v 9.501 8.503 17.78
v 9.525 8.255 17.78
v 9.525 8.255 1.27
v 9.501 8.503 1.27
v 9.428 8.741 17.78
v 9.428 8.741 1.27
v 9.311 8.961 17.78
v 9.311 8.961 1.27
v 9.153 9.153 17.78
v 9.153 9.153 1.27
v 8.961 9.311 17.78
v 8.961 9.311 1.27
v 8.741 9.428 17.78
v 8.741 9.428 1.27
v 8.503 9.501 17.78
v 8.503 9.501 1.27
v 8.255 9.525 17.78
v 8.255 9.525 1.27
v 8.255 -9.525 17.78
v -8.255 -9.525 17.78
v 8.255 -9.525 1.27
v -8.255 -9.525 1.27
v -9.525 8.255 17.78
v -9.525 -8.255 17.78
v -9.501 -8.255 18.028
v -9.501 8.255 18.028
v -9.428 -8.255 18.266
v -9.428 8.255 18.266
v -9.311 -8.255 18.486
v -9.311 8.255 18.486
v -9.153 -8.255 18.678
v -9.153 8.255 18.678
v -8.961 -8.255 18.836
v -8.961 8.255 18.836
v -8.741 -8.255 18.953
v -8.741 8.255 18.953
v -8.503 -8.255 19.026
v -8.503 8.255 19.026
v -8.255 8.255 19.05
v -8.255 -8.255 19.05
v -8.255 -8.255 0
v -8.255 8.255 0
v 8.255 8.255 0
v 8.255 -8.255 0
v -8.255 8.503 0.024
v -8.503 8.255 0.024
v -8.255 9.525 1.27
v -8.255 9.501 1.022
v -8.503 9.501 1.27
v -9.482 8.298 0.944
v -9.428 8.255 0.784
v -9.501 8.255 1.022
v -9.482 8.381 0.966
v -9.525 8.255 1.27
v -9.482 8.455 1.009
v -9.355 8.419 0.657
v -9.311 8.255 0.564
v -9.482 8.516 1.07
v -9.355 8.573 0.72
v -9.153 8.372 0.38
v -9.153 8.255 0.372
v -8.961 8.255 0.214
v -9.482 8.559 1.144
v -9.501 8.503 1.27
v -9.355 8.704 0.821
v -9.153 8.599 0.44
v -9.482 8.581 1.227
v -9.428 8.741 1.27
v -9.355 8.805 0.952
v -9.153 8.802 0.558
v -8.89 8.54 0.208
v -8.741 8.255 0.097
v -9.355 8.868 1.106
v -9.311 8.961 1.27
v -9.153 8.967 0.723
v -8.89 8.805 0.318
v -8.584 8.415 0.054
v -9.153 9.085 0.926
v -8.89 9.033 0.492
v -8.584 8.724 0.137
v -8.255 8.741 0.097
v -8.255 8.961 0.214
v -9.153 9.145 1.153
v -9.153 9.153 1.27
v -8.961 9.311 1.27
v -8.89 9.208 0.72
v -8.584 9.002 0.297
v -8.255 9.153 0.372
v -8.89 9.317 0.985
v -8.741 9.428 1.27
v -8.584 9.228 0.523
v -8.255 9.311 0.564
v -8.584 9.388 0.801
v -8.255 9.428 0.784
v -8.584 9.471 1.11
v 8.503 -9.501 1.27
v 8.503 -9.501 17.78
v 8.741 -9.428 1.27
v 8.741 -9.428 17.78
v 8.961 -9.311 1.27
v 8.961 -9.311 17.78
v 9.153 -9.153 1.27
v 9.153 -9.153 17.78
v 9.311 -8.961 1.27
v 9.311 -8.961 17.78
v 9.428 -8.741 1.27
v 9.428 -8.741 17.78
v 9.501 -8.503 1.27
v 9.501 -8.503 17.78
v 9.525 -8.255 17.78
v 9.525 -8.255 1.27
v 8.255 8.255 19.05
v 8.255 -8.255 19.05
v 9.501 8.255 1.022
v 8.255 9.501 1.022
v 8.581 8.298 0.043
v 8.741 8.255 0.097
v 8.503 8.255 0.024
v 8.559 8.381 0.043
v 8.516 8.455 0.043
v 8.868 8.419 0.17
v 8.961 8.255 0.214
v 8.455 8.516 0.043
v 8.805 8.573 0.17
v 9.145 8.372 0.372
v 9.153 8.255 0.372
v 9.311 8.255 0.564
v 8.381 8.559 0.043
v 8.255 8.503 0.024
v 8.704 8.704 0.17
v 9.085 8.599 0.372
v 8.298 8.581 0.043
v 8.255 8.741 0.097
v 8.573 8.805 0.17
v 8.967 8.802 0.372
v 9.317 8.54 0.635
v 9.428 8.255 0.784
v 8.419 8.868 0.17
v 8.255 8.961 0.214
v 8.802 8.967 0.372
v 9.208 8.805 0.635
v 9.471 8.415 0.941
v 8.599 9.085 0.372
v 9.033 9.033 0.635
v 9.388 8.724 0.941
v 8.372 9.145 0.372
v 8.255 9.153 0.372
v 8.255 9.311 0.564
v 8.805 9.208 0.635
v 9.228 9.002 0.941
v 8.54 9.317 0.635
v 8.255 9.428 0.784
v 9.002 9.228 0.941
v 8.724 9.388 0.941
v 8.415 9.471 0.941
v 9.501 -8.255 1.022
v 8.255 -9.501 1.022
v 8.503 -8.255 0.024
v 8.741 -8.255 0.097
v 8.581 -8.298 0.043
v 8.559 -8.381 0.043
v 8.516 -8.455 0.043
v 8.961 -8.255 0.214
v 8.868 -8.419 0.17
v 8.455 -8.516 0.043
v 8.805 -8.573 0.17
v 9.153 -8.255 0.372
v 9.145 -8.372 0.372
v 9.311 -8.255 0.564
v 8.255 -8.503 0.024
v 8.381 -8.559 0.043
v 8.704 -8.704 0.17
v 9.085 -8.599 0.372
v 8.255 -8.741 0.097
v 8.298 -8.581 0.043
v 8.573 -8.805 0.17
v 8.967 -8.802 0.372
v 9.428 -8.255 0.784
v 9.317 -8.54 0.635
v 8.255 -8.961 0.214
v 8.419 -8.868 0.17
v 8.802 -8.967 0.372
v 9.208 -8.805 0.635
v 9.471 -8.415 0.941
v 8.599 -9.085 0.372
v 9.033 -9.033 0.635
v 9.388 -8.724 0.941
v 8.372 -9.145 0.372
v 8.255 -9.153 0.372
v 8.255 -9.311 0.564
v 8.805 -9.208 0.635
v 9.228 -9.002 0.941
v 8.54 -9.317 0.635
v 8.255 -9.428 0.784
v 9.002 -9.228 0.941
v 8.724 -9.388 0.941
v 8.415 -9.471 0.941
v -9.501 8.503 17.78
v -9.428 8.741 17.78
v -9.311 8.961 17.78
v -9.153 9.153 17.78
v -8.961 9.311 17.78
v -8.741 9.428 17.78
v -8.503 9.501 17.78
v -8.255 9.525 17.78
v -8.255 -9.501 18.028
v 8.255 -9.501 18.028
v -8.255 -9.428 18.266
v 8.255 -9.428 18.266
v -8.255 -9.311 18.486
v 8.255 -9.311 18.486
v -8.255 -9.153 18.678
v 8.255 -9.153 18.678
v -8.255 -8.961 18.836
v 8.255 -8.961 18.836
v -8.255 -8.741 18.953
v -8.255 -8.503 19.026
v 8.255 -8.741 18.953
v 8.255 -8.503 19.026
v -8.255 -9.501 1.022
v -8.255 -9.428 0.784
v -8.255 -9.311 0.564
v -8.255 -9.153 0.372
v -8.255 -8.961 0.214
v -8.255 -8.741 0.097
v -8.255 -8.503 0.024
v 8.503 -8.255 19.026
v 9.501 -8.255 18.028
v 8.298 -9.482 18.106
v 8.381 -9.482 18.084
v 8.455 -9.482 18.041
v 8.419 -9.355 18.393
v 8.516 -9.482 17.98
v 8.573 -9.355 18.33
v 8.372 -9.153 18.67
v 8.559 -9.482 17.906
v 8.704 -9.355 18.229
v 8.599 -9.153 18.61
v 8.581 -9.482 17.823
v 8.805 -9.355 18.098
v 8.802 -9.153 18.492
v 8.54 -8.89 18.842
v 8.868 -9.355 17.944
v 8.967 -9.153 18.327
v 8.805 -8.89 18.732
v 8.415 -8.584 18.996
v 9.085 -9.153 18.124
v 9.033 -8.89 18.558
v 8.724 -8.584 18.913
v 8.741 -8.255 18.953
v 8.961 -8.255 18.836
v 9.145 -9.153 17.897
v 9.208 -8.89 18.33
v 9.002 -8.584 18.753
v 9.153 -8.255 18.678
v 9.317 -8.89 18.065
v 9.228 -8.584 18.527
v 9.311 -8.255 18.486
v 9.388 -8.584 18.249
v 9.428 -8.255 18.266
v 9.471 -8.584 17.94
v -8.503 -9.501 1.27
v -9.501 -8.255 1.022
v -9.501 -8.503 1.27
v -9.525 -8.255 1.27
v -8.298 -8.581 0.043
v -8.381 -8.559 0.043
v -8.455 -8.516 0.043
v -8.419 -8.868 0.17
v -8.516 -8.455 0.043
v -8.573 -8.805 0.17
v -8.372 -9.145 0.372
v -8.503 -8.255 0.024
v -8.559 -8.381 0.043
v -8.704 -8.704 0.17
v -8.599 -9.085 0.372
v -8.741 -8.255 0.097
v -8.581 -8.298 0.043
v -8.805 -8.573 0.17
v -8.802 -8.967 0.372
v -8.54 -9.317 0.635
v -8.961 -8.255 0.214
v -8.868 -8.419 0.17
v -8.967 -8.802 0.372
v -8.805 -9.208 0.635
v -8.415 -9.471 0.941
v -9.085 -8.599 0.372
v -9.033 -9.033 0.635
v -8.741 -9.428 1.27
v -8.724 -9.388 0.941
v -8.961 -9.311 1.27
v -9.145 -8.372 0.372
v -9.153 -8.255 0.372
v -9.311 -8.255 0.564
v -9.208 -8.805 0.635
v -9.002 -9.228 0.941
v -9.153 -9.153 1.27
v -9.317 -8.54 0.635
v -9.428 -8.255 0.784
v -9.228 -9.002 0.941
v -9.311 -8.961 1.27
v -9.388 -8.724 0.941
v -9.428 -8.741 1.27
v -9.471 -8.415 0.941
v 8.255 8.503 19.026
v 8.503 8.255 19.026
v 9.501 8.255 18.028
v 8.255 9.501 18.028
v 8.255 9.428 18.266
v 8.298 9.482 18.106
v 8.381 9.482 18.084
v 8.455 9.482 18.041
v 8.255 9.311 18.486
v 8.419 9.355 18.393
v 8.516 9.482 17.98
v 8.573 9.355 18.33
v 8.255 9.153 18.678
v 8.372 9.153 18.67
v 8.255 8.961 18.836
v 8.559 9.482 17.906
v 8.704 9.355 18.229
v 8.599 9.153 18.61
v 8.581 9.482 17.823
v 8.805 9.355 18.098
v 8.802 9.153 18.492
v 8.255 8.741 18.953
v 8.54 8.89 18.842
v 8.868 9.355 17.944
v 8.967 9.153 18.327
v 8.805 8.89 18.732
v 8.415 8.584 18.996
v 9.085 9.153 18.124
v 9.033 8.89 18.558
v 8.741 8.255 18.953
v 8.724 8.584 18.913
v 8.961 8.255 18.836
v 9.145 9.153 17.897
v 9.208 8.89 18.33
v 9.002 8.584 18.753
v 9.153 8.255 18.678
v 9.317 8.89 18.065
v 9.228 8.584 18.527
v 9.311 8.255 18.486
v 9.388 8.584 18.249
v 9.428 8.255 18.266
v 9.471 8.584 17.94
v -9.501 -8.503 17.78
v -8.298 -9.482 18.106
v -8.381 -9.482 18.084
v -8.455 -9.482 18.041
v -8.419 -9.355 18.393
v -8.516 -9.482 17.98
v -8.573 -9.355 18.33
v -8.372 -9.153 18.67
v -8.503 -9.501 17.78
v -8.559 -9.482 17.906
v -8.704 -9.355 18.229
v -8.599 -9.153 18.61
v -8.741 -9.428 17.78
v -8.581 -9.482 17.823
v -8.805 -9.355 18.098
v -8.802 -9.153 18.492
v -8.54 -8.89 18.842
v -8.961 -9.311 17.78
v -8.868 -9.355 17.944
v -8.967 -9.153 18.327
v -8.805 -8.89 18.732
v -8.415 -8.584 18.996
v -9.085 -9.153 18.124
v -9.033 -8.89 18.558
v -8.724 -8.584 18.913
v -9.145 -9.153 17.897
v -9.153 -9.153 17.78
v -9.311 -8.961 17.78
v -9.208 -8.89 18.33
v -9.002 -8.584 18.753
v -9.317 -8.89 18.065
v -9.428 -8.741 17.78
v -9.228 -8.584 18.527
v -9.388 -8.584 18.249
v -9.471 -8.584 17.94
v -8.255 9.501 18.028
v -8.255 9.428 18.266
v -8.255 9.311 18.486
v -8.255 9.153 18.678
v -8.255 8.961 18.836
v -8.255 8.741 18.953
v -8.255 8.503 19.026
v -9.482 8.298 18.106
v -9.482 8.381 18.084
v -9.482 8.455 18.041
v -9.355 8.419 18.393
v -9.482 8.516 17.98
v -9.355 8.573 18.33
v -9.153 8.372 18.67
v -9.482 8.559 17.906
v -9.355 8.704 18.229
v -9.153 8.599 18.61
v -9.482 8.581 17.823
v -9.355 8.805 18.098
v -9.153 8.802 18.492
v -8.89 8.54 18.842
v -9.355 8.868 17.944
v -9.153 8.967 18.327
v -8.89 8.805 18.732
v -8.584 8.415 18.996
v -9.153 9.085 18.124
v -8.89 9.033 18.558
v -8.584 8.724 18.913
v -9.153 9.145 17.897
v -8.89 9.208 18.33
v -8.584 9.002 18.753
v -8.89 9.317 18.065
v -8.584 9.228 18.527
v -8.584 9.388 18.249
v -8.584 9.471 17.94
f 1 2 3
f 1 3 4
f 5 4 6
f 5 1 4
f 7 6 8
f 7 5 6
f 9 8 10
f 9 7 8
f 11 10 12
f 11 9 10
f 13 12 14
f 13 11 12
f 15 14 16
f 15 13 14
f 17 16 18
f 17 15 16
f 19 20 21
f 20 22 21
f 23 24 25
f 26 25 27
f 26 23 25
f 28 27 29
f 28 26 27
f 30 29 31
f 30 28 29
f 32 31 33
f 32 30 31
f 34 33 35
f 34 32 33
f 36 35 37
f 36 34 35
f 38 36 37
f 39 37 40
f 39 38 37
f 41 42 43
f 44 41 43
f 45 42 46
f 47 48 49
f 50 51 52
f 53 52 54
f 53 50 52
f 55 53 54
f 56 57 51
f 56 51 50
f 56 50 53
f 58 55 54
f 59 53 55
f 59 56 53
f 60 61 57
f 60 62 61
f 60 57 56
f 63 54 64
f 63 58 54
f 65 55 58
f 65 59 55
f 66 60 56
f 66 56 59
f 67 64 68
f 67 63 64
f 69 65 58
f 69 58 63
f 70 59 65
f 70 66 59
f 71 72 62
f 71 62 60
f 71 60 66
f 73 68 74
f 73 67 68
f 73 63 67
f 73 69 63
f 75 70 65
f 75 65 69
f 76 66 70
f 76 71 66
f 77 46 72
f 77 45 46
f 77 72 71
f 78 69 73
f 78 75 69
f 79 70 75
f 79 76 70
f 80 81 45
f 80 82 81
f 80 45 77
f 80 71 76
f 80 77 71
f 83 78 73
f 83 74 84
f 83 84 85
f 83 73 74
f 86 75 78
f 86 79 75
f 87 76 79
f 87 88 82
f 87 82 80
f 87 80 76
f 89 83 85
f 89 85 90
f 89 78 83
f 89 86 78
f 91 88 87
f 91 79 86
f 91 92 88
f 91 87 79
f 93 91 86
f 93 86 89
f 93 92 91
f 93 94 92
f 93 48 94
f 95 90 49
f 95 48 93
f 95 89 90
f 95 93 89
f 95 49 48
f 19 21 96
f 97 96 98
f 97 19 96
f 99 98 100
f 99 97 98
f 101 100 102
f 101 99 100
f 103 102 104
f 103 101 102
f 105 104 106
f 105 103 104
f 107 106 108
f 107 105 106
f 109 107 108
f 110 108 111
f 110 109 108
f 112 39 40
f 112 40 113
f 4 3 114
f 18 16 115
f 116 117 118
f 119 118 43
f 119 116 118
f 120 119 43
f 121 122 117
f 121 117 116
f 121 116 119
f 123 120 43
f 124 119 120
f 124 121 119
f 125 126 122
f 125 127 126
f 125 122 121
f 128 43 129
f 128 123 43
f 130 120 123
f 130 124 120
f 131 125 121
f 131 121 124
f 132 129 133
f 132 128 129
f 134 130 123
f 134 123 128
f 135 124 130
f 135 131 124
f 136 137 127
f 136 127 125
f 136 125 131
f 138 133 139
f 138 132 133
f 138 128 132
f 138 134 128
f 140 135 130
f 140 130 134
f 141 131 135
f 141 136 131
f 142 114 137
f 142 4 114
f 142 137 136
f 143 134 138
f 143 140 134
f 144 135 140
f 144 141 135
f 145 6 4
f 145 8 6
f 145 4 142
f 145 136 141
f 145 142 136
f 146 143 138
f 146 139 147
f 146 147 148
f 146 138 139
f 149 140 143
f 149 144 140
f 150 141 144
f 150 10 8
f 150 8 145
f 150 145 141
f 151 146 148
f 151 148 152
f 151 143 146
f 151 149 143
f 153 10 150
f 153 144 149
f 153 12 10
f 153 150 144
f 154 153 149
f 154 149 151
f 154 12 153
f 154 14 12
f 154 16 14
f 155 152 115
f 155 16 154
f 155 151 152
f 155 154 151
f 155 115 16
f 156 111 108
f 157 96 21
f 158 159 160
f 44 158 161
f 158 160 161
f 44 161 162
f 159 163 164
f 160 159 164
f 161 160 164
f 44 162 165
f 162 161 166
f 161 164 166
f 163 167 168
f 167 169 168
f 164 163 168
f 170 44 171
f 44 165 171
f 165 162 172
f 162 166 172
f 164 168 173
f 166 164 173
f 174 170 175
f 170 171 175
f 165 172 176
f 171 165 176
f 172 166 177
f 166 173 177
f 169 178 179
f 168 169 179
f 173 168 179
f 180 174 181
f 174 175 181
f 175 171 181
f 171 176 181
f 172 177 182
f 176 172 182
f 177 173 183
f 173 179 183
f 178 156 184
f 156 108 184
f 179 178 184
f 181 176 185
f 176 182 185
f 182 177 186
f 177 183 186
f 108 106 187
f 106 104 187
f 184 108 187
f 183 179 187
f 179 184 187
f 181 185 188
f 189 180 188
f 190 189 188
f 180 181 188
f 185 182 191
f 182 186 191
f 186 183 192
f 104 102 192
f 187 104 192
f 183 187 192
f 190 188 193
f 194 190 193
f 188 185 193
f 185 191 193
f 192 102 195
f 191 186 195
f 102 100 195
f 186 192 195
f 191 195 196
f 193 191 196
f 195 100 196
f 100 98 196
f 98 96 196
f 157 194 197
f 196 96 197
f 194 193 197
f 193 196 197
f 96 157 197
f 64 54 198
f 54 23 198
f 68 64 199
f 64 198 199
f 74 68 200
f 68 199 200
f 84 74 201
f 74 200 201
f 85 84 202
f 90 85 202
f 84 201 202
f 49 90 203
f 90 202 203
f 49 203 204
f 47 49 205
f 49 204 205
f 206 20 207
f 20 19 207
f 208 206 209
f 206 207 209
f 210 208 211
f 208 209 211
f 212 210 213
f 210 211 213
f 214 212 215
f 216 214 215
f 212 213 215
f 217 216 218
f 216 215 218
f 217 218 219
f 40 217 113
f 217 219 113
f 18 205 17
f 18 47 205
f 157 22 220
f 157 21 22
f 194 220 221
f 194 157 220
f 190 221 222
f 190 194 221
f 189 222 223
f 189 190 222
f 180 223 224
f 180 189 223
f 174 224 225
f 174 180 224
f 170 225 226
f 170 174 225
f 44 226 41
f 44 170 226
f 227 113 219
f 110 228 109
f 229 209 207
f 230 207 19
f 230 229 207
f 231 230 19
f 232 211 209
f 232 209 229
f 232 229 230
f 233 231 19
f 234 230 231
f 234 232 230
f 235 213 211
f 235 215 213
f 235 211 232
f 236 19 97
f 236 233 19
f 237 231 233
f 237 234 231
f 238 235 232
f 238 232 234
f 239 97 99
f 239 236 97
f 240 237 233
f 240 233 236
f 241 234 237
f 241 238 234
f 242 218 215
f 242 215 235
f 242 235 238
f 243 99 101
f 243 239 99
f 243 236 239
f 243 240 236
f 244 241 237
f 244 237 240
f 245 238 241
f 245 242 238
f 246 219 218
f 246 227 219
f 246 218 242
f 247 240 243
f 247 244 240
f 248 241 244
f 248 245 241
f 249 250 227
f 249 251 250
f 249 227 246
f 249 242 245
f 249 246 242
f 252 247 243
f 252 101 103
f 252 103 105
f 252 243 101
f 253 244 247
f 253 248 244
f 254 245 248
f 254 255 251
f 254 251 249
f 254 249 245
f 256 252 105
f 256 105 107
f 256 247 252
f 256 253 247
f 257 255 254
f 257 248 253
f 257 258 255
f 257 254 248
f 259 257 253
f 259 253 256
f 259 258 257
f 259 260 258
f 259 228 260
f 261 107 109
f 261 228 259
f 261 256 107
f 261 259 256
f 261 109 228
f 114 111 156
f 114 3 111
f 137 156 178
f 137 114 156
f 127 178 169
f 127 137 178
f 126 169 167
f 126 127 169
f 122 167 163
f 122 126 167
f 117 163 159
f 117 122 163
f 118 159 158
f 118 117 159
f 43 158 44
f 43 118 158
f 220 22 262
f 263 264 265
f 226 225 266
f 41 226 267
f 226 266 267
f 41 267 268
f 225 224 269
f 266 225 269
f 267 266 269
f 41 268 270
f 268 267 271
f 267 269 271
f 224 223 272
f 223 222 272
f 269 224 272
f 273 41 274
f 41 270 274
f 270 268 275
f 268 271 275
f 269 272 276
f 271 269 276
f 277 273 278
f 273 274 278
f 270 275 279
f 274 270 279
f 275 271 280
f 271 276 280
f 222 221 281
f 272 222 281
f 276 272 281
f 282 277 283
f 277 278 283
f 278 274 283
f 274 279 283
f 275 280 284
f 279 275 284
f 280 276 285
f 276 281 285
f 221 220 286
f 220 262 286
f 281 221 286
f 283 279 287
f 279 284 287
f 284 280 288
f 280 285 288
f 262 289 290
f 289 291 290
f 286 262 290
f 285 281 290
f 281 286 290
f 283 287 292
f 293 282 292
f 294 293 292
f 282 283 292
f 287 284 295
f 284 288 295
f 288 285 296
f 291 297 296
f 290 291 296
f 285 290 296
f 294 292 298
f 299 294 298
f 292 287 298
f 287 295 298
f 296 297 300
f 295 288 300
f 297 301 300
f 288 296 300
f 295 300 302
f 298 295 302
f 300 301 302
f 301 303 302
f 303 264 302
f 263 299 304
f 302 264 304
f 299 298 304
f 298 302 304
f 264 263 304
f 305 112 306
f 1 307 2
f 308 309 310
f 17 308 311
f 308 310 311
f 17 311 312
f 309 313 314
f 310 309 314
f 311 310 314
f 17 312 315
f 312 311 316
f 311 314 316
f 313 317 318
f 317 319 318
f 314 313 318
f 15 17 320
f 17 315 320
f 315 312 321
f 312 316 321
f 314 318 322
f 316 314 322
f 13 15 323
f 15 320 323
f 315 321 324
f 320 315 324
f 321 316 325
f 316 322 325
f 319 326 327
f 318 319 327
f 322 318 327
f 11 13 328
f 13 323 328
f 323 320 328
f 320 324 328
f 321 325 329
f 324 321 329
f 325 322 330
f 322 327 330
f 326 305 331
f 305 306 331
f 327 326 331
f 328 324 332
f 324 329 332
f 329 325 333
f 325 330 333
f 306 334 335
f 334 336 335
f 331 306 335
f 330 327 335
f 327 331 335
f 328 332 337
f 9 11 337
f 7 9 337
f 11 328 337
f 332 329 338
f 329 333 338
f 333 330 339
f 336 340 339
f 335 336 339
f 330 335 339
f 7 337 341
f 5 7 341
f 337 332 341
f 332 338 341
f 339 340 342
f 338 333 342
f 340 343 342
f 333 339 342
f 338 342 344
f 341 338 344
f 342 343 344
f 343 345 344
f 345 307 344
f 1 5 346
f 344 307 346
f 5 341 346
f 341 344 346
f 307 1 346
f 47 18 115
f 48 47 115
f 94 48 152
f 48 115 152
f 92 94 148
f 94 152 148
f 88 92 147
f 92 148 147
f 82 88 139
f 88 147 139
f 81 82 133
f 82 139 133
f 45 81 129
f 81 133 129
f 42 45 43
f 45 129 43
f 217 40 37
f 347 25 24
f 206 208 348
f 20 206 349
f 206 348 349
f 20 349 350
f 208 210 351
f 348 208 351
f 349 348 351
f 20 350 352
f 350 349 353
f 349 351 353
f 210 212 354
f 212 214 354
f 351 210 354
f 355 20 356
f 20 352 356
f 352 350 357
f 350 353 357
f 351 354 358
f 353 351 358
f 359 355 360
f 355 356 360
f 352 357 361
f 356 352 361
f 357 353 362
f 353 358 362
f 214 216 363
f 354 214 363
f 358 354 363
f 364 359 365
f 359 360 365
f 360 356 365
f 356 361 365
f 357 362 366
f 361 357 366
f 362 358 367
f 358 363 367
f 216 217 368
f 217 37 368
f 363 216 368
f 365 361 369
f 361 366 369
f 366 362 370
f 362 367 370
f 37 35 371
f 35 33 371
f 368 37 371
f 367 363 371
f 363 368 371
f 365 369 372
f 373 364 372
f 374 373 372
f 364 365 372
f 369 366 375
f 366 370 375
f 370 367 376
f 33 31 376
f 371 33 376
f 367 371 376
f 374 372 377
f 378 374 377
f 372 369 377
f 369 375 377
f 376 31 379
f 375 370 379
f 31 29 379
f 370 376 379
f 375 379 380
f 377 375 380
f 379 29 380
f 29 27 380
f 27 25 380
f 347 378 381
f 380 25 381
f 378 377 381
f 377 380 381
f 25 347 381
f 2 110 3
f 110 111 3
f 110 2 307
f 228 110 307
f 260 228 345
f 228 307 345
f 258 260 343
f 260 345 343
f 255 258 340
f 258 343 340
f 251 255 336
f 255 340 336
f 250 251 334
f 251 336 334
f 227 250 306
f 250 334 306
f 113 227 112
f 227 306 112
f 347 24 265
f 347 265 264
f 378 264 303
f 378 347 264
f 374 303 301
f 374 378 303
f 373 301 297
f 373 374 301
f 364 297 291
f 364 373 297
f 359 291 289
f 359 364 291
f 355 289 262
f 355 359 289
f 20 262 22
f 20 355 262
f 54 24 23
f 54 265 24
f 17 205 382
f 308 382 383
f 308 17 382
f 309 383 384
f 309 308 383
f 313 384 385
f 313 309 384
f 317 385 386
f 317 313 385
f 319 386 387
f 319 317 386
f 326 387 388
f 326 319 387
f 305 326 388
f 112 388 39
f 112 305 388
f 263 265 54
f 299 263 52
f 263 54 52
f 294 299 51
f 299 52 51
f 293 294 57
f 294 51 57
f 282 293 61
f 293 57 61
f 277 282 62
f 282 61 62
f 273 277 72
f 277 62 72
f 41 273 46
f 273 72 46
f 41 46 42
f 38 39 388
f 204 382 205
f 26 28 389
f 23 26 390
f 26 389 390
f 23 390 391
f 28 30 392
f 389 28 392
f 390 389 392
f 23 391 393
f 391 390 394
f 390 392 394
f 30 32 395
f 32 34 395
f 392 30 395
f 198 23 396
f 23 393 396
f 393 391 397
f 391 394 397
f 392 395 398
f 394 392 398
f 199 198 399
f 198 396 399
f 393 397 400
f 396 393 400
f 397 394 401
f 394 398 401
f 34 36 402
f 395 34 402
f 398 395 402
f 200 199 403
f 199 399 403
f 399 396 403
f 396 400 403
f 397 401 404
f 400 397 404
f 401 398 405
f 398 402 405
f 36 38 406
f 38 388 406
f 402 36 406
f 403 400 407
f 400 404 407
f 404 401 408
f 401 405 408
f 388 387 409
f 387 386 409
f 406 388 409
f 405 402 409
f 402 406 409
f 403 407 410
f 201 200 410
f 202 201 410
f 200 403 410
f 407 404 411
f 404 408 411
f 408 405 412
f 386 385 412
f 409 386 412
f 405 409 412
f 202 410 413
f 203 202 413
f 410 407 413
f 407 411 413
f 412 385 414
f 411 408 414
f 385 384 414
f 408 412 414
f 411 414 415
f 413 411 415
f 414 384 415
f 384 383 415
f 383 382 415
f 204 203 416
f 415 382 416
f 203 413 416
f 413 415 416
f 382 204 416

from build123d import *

# Parameters (mm, degrees)
F0_W     = 19.05
F0_H     = 19.05
F1_DEPTH = 19.05
F2_R     = 1.27


with BuildPart() as f1:
    # F0 (on Top) → F1 (new body)
    with BuildSketch(Plane.XY):
        Rectangle(F0_W, F0_H)
    extrude(amount=F1_DEPTH)

    # F2
    f2_edges = [f1.edges().sort_by_distance(p)[0] for p in [
        (9.525, 0, 19.05),
        (0, 9.525, 19.05),
        (-9.525, 0, 19.05),
        (0, -9.525, 19.05),
        (9.525, -9.525, 9.525),
        (9.525, 9.525, 9.525),
        (9.525, 0, 0),
        (-9.525, -9.525, 9.525),
        (0, -9.525, 0),
        (0, 9.525, 0),
        (-9.525, 0, 0),
        (-9.525, 9.525, 9.525),
    ]]
    fillet(f2_edges, radius=F2_R)


solid = f1.part
